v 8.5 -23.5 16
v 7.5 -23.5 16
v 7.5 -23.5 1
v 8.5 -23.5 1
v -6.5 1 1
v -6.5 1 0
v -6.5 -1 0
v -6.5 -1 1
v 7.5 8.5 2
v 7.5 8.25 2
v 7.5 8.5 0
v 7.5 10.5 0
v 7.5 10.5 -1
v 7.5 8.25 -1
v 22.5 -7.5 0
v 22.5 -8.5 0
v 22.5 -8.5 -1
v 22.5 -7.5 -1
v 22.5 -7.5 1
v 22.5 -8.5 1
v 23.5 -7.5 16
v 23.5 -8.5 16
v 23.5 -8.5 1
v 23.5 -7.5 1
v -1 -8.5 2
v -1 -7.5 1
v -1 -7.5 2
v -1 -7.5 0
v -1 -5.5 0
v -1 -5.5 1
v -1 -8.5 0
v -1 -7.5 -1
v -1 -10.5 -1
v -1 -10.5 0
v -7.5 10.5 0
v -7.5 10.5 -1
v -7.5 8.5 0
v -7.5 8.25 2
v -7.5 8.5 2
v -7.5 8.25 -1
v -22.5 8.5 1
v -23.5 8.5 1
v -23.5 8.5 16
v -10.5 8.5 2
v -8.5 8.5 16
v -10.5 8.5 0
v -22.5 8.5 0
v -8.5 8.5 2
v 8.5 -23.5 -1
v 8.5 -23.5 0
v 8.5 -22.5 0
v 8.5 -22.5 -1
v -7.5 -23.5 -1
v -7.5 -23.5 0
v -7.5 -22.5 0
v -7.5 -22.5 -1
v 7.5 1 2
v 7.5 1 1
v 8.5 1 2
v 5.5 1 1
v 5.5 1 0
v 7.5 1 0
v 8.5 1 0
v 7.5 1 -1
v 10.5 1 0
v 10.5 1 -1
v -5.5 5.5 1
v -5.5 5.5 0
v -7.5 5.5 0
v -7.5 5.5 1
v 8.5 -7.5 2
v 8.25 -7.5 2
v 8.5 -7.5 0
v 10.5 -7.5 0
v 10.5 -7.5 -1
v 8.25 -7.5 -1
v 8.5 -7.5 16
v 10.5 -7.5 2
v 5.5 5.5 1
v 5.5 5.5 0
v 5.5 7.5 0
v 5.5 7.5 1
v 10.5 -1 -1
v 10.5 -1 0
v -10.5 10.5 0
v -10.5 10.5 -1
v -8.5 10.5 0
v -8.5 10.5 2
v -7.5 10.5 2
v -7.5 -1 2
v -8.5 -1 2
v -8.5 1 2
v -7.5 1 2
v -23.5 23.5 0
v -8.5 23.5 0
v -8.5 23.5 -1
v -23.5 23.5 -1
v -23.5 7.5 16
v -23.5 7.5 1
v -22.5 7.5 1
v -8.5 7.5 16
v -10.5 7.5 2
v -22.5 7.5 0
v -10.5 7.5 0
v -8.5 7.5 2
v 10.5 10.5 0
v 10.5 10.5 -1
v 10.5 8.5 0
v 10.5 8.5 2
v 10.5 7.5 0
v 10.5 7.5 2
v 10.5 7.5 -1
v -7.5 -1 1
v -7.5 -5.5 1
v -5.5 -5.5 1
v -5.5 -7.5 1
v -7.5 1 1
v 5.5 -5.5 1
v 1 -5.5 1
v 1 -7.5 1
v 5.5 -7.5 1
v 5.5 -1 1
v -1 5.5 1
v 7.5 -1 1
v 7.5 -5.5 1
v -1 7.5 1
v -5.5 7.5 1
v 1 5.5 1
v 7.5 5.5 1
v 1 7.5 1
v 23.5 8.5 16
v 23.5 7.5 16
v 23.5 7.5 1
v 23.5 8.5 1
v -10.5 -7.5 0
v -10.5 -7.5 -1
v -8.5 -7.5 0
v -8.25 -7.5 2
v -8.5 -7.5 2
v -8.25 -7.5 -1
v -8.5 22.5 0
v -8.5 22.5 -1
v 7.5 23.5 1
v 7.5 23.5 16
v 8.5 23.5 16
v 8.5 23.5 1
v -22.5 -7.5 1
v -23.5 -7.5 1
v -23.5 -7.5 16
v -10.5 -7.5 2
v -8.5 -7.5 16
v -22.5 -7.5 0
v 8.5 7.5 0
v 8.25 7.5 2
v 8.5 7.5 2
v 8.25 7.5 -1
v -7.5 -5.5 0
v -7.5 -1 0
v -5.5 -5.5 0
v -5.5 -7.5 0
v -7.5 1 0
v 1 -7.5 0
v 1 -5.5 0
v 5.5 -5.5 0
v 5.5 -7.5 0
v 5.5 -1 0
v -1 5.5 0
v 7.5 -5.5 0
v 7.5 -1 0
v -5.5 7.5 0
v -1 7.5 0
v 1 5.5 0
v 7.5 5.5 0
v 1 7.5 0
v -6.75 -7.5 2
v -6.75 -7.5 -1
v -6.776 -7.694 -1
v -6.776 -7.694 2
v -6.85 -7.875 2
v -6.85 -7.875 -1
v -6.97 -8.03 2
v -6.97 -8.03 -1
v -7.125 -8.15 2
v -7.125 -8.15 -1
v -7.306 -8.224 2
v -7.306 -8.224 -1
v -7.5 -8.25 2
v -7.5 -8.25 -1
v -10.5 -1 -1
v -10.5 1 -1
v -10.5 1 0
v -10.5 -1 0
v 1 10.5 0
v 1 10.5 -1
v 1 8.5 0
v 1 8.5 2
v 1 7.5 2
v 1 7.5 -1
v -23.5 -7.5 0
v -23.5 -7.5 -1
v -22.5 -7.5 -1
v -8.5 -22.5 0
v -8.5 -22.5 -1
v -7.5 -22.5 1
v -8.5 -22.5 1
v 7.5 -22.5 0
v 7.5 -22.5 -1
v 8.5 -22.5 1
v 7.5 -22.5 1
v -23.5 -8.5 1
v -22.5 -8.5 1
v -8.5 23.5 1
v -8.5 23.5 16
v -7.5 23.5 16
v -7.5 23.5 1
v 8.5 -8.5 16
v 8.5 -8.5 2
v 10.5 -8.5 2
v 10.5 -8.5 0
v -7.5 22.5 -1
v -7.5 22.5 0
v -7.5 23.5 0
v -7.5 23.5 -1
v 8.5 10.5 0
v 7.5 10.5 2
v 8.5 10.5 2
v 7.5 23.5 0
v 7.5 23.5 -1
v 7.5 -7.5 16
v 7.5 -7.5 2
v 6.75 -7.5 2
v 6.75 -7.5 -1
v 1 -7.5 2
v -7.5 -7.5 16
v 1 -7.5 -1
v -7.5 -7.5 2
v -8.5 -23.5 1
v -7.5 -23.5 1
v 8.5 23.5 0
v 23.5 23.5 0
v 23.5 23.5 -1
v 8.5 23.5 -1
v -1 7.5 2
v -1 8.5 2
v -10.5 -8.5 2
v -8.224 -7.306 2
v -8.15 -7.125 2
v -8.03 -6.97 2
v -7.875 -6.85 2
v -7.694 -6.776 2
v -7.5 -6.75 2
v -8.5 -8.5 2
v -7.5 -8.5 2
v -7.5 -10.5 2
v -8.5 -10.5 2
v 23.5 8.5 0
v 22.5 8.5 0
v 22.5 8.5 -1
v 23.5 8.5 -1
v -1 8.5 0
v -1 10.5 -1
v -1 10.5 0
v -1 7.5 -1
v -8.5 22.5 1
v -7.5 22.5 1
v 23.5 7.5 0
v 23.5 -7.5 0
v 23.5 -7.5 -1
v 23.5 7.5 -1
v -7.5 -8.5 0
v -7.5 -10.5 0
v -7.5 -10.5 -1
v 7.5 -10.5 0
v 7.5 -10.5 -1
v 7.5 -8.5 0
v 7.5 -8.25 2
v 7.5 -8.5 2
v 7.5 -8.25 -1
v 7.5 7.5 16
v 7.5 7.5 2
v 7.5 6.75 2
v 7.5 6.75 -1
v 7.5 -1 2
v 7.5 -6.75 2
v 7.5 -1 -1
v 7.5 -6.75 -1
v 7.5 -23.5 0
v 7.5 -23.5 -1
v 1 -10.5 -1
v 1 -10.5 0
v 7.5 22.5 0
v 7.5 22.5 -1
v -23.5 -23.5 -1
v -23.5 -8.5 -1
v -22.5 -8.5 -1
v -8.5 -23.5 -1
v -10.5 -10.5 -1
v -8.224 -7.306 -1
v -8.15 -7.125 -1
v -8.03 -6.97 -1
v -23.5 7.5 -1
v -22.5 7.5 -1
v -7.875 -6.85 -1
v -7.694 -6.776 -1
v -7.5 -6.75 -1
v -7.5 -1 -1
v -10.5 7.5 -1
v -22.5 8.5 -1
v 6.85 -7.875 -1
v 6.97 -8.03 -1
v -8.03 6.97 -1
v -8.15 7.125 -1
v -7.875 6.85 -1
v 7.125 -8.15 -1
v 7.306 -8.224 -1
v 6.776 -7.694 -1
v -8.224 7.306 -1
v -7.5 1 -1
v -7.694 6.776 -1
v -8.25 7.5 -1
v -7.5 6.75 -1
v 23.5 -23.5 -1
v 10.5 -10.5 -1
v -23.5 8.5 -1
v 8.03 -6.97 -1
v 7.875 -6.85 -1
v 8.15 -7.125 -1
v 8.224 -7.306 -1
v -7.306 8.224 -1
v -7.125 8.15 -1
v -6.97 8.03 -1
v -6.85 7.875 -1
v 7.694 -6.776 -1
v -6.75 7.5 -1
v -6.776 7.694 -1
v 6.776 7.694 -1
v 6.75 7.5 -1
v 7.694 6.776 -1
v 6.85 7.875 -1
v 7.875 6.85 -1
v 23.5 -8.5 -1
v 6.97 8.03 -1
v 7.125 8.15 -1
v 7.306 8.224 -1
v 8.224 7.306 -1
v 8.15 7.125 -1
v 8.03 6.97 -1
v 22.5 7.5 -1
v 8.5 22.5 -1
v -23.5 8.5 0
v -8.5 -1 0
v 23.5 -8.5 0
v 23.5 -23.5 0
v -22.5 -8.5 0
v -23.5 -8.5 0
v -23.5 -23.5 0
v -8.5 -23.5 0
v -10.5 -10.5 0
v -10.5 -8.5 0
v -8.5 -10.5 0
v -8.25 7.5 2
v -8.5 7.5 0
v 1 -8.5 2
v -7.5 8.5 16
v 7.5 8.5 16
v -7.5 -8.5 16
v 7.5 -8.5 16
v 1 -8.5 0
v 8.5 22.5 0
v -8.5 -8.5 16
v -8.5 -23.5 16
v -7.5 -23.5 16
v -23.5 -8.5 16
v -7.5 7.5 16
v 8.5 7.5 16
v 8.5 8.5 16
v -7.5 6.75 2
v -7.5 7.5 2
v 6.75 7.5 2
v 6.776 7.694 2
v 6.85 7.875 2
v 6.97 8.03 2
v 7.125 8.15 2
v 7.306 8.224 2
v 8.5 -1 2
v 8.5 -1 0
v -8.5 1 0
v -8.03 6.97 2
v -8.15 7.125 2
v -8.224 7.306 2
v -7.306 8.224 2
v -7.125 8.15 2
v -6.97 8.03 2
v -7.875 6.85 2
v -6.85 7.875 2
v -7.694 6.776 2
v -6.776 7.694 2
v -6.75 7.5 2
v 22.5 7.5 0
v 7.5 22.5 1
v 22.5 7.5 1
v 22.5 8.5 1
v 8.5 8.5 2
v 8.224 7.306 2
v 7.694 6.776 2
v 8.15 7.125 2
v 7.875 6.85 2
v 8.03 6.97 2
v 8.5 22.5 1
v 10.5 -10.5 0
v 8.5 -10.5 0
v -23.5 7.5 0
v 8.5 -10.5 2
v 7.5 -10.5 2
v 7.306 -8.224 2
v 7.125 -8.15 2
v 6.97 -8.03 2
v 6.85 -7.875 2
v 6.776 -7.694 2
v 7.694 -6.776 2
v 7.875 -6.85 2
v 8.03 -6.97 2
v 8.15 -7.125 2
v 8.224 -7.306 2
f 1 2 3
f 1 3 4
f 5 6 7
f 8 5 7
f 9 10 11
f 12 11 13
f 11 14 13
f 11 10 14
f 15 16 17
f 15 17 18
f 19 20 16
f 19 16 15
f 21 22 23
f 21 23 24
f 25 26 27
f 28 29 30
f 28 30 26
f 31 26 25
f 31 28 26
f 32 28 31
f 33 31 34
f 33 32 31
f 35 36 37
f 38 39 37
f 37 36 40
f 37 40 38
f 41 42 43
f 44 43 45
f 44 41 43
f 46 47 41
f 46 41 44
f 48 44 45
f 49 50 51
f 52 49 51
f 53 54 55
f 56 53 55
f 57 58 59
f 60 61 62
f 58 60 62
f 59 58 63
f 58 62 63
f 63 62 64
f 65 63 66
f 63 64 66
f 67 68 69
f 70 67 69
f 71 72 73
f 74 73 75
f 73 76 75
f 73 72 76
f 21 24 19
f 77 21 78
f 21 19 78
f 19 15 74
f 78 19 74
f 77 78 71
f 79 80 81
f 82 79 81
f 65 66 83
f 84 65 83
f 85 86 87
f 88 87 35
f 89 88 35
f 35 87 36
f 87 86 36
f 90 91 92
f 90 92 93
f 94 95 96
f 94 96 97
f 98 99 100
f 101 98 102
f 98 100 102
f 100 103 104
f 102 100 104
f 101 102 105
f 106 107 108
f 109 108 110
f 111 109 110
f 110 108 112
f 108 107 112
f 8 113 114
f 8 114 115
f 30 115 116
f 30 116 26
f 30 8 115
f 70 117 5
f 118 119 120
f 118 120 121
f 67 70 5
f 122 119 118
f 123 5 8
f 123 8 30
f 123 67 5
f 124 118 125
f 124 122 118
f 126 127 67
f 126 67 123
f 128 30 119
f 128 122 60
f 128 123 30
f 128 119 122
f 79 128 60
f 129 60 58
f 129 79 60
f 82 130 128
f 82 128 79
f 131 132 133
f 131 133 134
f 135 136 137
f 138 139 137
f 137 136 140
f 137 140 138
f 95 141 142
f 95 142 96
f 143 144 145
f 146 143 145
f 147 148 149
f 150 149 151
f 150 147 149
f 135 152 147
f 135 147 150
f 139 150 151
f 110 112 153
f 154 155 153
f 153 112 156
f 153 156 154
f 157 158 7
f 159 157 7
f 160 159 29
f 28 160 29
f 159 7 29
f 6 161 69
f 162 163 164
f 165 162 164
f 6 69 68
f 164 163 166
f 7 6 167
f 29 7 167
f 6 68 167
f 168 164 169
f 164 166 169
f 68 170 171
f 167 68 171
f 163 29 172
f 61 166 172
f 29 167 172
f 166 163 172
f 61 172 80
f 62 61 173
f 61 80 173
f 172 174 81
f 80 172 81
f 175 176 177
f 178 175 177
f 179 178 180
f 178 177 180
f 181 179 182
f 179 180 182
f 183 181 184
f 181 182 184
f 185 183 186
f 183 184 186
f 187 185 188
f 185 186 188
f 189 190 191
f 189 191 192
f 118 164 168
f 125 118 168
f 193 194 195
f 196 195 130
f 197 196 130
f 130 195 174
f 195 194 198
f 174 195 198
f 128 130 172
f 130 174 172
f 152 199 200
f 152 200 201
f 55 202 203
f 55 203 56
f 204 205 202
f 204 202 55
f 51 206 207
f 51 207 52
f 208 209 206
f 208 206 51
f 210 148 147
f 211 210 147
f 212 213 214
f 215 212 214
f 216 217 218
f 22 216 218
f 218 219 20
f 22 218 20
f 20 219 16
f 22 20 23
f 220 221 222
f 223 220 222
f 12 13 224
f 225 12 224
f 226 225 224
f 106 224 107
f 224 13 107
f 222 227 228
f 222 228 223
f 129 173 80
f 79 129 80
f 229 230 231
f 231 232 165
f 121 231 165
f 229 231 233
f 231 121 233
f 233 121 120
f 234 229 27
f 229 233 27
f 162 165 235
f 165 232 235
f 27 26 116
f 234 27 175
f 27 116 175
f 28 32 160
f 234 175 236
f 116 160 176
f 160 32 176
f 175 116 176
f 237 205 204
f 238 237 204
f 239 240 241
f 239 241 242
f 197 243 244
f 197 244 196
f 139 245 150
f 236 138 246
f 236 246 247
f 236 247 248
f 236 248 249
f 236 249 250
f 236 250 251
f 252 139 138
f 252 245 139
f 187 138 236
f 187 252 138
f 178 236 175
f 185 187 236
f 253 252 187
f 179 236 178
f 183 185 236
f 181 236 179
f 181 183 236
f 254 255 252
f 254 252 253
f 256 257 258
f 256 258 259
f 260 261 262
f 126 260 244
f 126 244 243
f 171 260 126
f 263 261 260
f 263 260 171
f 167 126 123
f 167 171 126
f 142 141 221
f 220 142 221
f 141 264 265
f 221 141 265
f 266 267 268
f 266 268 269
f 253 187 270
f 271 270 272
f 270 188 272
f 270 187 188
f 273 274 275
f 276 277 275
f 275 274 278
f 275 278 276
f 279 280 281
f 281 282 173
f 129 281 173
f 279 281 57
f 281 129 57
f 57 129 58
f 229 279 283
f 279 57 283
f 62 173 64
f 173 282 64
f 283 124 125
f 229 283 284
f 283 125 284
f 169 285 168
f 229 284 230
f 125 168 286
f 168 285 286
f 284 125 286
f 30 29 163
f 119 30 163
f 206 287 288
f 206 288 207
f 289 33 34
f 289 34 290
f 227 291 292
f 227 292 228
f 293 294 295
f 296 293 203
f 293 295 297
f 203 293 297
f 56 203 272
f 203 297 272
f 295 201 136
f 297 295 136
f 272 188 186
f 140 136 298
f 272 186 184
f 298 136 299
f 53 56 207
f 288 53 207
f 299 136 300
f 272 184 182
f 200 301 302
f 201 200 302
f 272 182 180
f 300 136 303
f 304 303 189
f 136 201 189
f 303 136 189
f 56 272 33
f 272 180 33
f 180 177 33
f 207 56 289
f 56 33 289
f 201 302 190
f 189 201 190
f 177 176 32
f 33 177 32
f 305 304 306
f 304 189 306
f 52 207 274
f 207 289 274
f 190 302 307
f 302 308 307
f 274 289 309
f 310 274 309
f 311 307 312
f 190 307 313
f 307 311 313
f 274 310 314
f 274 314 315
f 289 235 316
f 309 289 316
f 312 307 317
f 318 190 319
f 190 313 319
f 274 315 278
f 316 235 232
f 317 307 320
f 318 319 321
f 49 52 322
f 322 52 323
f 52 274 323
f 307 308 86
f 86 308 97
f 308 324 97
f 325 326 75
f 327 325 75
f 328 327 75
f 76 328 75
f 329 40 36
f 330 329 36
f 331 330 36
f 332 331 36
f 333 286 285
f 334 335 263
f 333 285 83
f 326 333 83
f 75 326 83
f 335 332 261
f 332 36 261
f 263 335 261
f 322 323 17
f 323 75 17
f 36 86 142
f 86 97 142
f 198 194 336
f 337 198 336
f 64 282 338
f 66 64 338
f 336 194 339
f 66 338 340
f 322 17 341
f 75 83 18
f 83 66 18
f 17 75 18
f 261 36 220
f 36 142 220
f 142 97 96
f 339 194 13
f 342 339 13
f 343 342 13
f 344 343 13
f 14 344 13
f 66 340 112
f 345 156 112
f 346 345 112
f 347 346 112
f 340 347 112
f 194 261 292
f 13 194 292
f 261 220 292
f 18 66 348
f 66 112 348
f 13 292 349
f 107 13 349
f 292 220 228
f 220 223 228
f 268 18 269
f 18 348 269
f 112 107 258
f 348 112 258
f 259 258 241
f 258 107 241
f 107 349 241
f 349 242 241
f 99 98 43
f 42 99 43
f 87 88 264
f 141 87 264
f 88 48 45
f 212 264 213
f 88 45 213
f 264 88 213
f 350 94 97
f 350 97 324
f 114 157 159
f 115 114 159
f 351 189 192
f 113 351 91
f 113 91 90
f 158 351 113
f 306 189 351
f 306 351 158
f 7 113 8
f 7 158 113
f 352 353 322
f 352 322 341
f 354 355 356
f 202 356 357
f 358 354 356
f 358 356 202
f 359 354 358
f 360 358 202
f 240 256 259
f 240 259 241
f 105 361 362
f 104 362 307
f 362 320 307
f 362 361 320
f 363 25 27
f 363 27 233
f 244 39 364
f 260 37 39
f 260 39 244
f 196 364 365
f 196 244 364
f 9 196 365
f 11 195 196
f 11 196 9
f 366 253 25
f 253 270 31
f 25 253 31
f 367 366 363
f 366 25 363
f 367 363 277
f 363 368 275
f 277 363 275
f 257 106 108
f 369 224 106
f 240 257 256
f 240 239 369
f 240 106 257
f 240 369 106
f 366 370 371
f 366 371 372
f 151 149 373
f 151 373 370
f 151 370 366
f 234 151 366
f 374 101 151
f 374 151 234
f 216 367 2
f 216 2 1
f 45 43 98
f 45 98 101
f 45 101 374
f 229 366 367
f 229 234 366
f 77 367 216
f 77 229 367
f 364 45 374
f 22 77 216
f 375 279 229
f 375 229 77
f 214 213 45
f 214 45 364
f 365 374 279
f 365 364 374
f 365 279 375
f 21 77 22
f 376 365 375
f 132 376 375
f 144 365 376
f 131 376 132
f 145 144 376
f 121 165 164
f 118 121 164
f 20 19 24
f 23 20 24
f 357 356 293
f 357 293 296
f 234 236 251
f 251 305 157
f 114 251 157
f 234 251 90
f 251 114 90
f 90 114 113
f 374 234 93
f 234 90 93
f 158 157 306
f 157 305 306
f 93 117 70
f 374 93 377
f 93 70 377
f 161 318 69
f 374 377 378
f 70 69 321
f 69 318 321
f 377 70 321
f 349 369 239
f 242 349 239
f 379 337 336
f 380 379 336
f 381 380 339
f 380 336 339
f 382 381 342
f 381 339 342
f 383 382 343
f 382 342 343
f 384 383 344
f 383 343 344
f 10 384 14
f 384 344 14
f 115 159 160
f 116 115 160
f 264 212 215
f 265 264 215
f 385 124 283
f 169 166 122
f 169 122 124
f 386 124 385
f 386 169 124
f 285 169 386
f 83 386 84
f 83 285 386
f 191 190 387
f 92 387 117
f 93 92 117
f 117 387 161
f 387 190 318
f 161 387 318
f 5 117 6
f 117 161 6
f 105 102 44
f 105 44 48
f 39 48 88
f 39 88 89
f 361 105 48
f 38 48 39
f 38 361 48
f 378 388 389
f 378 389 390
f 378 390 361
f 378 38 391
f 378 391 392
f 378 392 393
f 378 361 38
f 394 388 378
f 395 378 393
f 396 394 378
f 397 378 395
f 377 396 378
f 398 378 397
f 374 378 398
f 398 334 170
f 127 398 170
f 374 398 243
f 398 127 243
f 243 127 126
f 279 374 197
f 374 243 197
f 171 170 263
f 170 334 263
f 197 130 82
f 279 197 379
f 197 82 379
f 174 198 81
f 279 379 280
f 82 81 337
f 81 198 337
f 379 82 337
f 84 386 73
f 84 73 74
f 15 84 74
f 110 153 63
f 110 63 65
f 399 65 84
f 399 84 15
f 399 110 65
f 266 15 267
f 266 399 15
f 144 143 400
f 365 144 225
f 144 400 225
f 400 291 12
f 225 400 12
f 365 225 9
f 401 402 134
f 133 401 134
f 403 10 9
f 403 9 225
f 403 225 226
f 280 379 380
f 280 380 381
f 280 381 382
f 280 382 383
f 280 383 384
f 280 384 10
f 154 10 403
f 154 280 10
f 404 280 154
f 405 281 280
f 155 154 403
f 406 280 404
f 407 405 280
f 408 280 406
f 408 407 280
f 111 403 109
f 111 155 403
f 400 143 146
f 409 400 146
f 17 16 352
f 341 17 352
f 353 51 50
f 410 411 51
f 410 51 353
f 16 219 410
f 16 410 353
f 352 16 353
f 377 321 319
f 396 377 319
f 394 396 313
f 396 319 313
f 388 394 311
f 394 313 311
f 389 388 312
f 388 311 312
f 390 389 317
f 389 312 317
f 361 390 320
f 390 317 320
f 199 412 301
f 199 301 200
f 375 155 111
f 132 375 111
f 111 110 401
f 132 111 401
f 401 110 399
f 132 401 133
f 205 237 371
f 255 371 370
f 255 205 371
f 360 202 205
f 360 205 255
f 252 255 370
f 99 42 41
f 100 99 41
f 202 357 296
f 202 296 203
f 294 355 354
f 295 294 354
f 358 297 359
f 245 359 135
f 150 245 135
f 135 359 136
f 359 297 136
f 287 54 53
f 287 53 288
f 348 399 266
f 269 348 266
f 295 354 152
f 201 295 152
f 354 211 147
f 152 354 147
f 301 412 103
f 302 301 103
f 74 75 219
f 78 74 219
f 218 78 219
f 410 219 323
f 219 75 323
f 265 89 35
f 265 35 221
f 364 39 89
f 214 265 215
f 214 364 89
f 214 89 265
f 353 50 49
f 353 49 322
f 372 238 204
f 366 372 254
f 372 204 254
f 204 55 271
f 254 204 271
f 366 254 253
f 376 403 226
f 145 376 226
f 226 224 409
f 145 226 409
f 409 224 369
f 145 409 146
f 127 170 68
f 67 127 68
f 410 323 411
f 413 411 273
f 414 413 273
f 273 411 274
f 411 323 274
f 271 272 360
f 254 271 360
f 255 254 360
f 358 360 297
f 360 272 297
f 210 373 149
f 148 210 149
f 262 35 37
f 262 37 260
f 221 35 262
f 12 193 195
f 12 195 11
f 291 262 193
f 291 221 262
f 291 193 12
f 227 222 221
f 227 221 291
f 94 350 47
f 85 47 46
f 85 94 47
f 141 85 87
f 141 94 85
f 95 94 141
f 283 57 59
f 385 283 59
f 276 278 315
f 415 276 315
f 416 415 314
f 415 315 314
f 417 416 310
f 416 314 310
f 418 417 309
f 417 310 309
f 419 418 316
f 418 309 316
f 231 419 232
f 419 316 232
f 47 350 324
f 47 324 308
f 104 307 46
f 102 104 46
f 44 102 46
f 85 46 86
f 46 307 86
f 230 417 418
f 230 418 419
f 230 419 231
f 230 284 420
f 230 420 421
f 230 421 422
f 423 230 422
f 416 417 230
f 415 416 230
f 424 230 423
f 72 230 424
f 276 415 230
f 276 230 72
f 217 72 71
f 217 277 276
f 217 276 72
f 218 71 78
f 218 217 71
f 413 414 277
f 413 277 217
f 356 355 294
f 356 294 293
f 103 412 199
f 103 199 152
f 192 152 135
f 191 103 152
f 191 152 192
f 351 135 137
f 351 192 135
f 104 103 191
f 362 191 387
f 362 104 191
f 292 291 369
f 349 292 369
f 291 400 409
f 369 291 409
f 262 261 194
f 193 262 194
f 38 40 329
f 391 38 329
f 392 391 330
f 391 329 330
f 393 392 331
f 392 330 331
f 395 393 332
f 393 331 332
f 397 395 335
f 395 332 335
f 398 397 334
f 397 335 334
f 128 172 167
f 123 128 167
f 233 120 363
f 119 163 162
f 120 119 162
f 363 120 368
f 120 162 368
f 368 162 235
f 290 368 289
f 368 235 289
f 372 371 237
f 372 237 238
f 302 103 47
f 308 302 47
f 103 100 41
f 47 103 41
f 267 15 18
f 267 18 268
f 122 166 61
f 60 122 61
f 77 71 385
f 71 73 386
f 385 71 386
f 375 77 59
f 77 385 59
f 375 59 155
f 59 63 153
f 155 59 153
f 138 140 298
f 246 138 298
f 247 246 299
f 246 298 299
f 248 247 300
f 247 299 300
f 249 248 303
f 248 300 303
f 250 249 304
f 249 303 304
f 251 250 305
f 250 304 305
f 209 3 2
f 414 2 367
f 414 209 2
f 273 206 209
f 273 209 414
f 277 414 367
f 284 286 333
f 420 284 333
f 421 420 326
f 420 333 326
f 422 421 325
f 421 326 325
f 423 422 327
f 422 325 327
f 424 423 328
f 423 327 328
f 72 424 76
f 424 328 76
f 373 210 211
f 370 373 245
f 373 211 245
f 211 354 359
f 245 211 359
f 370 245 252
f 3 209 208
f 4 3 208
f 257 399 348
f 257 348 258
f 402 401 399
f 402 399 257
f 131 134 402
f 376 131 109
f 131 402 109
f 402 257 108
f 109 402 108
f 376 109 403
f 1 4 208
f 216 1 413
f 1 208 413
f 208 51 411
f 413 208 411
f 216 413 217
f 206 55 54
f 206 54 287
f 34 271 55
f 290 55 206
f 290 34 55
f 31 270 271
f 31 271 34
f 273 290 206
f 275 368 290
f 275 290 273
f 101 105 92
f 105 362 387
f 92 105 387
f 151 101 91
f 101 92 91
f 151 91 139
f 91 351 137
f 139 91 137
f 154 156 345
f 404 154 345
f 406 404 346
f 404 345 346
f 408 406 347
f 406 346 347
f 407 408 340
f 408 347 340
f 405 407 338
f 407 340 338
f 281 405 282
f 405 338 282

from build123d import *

# Parameters (mm, degrees)
F0_W     = 1
F0_H     = 15
F0_W_2   = 15
F0_H_2   = 1
F1_DEPTH = 1
F2_DEPTH = 16
F3_W     = 2
F3_H     = 3
F3_W_2   = 3
F3_H_2   = 2
F4_DEPTH = 3
F5_W     = 1
F5_H     = 1
F6_DEPTH = 25
F7_DEPTH = 15
F9_DEPTH = 1


with BuildPart() as f1:
    # F0 (on Top) → F1 (new body)
    with BuildSketch(Plane.XY):
        with Locations((8, 0)):
            Rectangle(F0_W, F0_H)
        with Locations((-16, -8)):
            Rectangle(F0_W_2, F0_H_2)
        with Locations((-16, 0)):
            Rectangle(F0_W_2, F0_H)
        with Locations((8, -16)):
            Rectangle(F0_W, F0_H)
        with Locations((0, -16)):
            Rectangle(F0_W_2, F0_H)
        with Locations((-8, -16)):
            Rectangle(F0_W, F0_H)
        with Locations((16, -16)):
            Rectangle(F0_W_2, F0_H)
        with Locations((-16, -16)):
            Rectangle(F0_W_2, F0_H)
        with Locations((16, 0)):
            Rectangle(F0_W_2, F0_H)
        with Locations((16, -8)):
            Rectangle(F0_W_2, F0_H_2)
        with Locations((0, -8)):
            Rectangle(F0_W_2, F0_H_2)
        with Locations((-8, 0)):
            Rectangle(F0_W, F0_H)
        Rectangle(F0_W_2, F0_H)
        with Locations((8, -8)):
            Rectangle(F0_W, F0_H_2)
        with Locations((-8, -8)):
            Rectangle(F0_W, F0_H_2)
        with Locations((-8, 8)):
            Rectangle(F0_W, F0_H_2)
        with Locations((-16, 8)):
            Rectangle(F0_W_2, F0_H_2)
        with Locations((8, 16)):
            Rectangle(F0_W, F0_H)
        with Locations((0, 16)):
            Rectangle(F0_W_2, F0_H)
        with Locations((-8, 16)):
            Rectangle(F0_W, F0_H)
        with Locations((16, 16)):
            Rectangle(F0_W_2, F0_H)
        with Locations((16, 8)):
            Rectangle(F0_W_2, F0_H_2)
        with Locations((-16, 16)):
            Rectangle(F0_W_2, F0_H)
        with Locations((8, 8)):
            Rectangle(F0_W, F0_H_2)
        with Locations((0, 8)):
            Rectangle(F0_W_2, F0_H_2)
    extrude(amount=-F1_DEPTH)

    # F0 (on Top) → F2 (join)
    with BuildSketch(Plane.XY):
        with Locations((-8, -8)):
            Rectangle(F0_W, F0_H_2)
        with Locations((8, -8)):
            Rectangle(F0_W, F0_H_2)
        with Locations((-8, 8)):
            Rectangle(F0_W, F0_H_2)
        with Locations((8, 8)):
            Rectangle(F0_W, F0_H_2)
        with Locations((16, 8)):
            Rectangle(F0_W_2, F0_H_2)
        with Locations((8, 16)):
            Rectangle(F0_W, F0_H)
        with Locations((-8, 16)):
            Rectangle(F0_W, F0_H)
        with Locations((0, 8)):
            Rectangle(F0_W_2, F0_H_2)
        with Locations((-16, 8)):
            Rectangle(F0_W_2, F0_H_2)
        with Locations((-8, 0)):
            Rectangle(F0_W, F0_H)
        with Locations((-16, -8)):
            Rectangle(F0_W_2, F0_H_2)
        with Locations((0, -8)):
            Rectangle(F0_W_2, F0_H_2)
        with Locations((16, -8)):
            Rectangle(F0_W_2, F0_H_2)
        with Locations((8, -16)):
            Rectangle(F0_W, F0_H)
        with Locations((-8, -16)):
            Rectangle(F0_W, F0_H)
        with Locations((8, 0)):
            Rectangle(F0_W, F0_H)
    extrude(amount=F2_DEPTH)

    # F3 (on face) → F4 (cut)
    with BuildSketch(Plane(origin=(0, 0, -1), x_dir=(1, 0, 0), z_dir=(0, 0, -1))):
        with BuildLine():
            Line((-7.5, 8.25), (-7.5, 7.5))
            Line((-7.5, 7.5), (-6.75, 7.5))
            ThreePointArc((-6.75, 7.5), (-6.9696699141, 8.0303300859), (-7.5, 8.25))
        make_face()
        with BuildLine():
            Line((-6.75, 7.5), (-7.5, 7.5))
            Line((-7.5, 7.5), (-7.5, 6.75))
            ThreePointArc((-7.5, 6.75), (-6.9696699141, 6.9696699141), (-6.75, 7.5))
        make_face()
        with BuildLine():
            Line((-7.5, 6.75), (-7.5, 7.5))
            Line((-7.5, 7.5), (-8.25, 7.5))
            ThreePointArc((-8.25, 7.5), (-8.0303300859, 6.9696699141), (-7.5, 6.75))
        make_face()
        with BuildLine():
            Line((-8.25, 7.5), (-7.5, 7.5))
            Line((-7.5, 7.5), (-7.5, 8.25))
            ThreePointArc((-7.5, 8.25), (-8.0303300859, 8.0303300859), (-8.25, 7.5))
        make_face()
        with BuildLine():
            Line((-1, 7.5), (-6.75, 7.5))
            ThreePointArc((-6.75, 7.5), (-6.9696699141, 6.9696699141), (-7.5, 6.75))
            Line((-7.5, 6.75), (-7.5, 1))
            Line((-7.5, 1), (-7.5, -1))
            Line((-7.5, -1), (-7.5, -6.75))
            ThreePointArc((-7.5, -6.75), (-6.9696699141, -6.9696699141), (-6.75, -7.5))
            Line((-6.75, -7.5), (-1, -7.5))
            Line((-1, -7.5), (1, -7.5))
            Line((1, -7.5), (6.75, -7.5))
            ThreePointArc((6.75, -7.5), (6.9696699141, -6.9696699141), (7.5, -6.75))
            Line((7.5, -6.75), (7.5, -1))
            Line((7.5, -1), (7.5, 1))
            Line((7.5, 1), (7.5, 6.75))
            ThreePointArc((7.5, 6.75), (6.9696699141, 6.9696699141), (6.75, 7.5))
            Line((6.75, 7.5), (1, 7.5))
            Line((1, 7.5), (-1, 7.5))
        make_face()
        with BuildLine():
            Line((-10.5, 7.5), (-8.25, 7.5))
            ThreePointArc((-8.25, 7.5), (-8.0303300859, 8.0303300859), (-7.5, 8.25))
            Line((-7.5, 8.25), (-7.5, 10.5))
            Line((-7.5, 10.5), (-10.5, 10.5))
            Line((-10.5, 10.5), (-10.5, 7.5))
        make_face()
        with Locations((0, 9)):
            Rectangle(F3_W, F3_H)
        with Locations((-9, 0)):
            Rectangle(F3_W_2, F3_H_2)
        with BuildLine():
            ThreePointArc((7.5, 8.25), (6.9696699141, 8.0303300859), (6.75, 7.5))
            Line((6.75, 7.5), (7.5, 7.5))
            Line((7.5, 7.5), (7.5, 8.25))
        make_face()
        with BuildLine():
            Line((7.5, 7.5), (6.75, 7.5))
            ThreePointArc((6.75, 7.5), (6.9696699141, 6.9696699141), (7.5, 6.75))
            Line((7.5, 6.75), (7.5, 7.5))
        make_face()
        with BuildLine():
            ThreePointArc((-6.75, -7.5), (-6.9696699141, -6.9696699141), (-7.5, -6.75))
            Line((-7.5, -6.75), (-7.5, -7.5))
            Line((-7.5, -7.5), (-6.75, -7.5))
        make_face()
        with BuildLine():
            Line((-7.5, -7.5), (-7.5, -6.75))
            ThreePointArc((-7.5, -6.75), (-8.0303300859, -6.9696699141), (-8.25, -7.5))
            Line((-8.25, -7.5), (-7.5, -7.5))
        make_face()
        with BuildLine():
            Line((8.25, 7.5), (7.5, 7.5))
            Line((7.5, 7.5), (7.5, 6.75))
            ThreePointArc((7.5, 6.75), (8.0303300859, 6.9696699141), (8.25, 7.5))
        make_face()
        with BuildLine():
            Line((7.5, 8.25), (7.5, 7.5))
            Line((7.5, 7.5), (8.25, 7.5))
            ThreePointArc((8.25, 7.5), (8.0303300859, 8.0303300859), (7.5, 8.25))
        make_face()
        with BuildLine():
            Line((7.5, 10.5), (7.5, 8.25))
            ThreePointArc((7.5, 8.25), (8.0303300859, 8.0303300859), (8.25, 7.5))
            Line((8.25, 7.5), (10.5, 7.5))
            Line((10.5, 7.5), (10.5, 10.5))
            Line((10.5, 10.5), (7.5, 10.5))
        make_face()
        with BuildLine():
            Line((-7.5, -8.25), (-7.5, -7.5))
            Line((-7.5, -7.5), (-8.25, -7.5))
            ThreePointArc((-8.25, -7.5), (-8.0303300859, -8.0303300859), (-7.5, -8.25))
        make_face()
        with BuildLine():
            Line((-6.75, -7.5), (-7.5, -7.5))
            Line((-7.5, -7.5), (-7.5, -8.25))
            ThreePointArc((-7.5, -8.25), (-6.9696699141, -8.0303300859), (-6.75, -7.5))
        make_face()
        with BuildLine():
            ThreePointArc((-7.5, -8.25), (-8.0303300859, -8.0303300859), (-8.25, -7.5))
            Line((-8.25, -7.5), (-10.5, -7.5))
            Line((-10.5, -7.5), (-10.5, -10.5))
            Line((-10.5, -10.5), (-7.5, -10.5))
            Line((-7.5, -10.5), (-7.5, -8.25))
        make_face()
        with Locations((9, 0)):
            Rectangle(F3_W_2, F3_H_2)
        with Locations((0, -9)):
            Rectangle(F3_W, F3_H)
        with BuildLine():
            ThreePointArc((8.25, -7.5), (8.0303300859, -6.9696699141), (7.5, -6.75))
            Line((7.5, -6.75), (7.5, -7.5))
            Line((7.5, -7.5), (8.25, -7.5))
        make_face()
        with BuildLine():
            Line((7.5, -7.5), (7.5, -6.75))
            ThreePointArc((7.5, -6.75), (6.9696699141, -6.9696699141), (6.75, -7.5))
            Line((6.75, -7.5), (7.5, -7.5))
        make_face()
        with BuildLine():
            Line((7.5, -7.5), (6.75, -7.5))
            ThreePointArc((6.75, -7.5), (6.9696699141, -8.0303300859), (7.5, -8.25))
            Line((7.5, -8.25), (7.5, -7.5))
        make_face()
        with BuildLine():
            Line((8.25, -7.5), (7.5, -7.5))
            Line((7.5, -7.5), (7.5, -8.25))
            ThreePointArc((7.5, -8.25), (8.0303300859, -8.0303300859), (8.25, -7.5))
        make_face()
        with BuildLine():
            Line((10.5, -7.5), (8.25, -7.5))
            ThreePointArc((8.25, -7.5), (8.0303300859, -8.0303300859), (7.5, -8.25))
            Line((7.5, -8.25), (7.5, -10.5))
            Line((7.5, -10.5), (10.5, -10.5))
            Line((10.5, -10.5), (10.5, -7.5))
        make_face()
    extrude(amount=-F4_DEPTH, mode=Mode.SUBTRACT)

    # F5 (on face) → F6 (cut)
    with BuildSketch(Plane.XY.offset(16)):
        with Locations((-8, 23)):
            Rectangle(F5_W, F5_H)
        with Locations((-23, 8)):
            Rectangle(F5_W, F5_H)
        with Locations((8, 23)):
            Rectangle(F5_W, F5_H)
        with Locations((23, 8)):
            Rectangle(F5_W, F5_H)
        with Locations((23, -8)):
            Rectangle(F5_W, F5_H)
        with Locations((8, -23)):
            Rectangle(F5_W, F5_H)
        with Locations((-8, -23)):
            Rectangle(F5_W, F5_H)
        with Locations((-23, -8)):
            Rectangle(F5_W, F5_H)
    extrude(amount=-F6_DEPTH, mode=Mode.SUBTRACT)

    # F5 (on face) → F7 (join)
    with BuildSketch(Plane.XY.offset(16)):
        with Locations((-8, 23)):
            Rectangle(F5_W, F5_H)
        with Locations((-23, 8)):
            Rectangle(F5_W, F5_H)
        with Locations((8, 23)):
            Rectangle(F5_W, F5_H)
        with Locations((23, 8)):
            Rectangle(F5_W, F5_H)
        with Locations((23, -8)):
            Rectangle(F5_W, F5_H)
        with Locations((8, -23)):
            Rectangle(F5_W, F5_H)
        with Locations((-8, -23)):
            Rectangle(F5_W, F5_H)
        with Locations((-23, -8)):
            Rectangle(F5_W, F5_H)
    extrude(amount=-F7_DEPTH)

    # F8 (on Top) → F9 (join)
    with BuildSketch(Plane.XY):
        Polygon((-1, 7.5), (-5.5, 7.5), (-5.5, 5.5), (-7.5, 5.5), (-7.5, 1), (-6.5, 1), (-6.5, -1), (-7.5, -1), (-7.5, -5.5), (-5.5, -5.5), (-5.5, -7.5), (-1, -7.5), (-1, -5.5), (1, -5.5), (1, -7.5), (5.5, -7.5), (5.5, -5.5), (7.5, -5.5), (7.5, -1), (5.5, -1), (5.5, 1), (7.5, 1), (7.5, 5.5), (5.5, 5.5), (5.5, 7.5), (1, 7.5), (1, 5.5), (-1, 5.5), align=None)
    extrude(amount=F9_DEPTH)


solid = f1.part
